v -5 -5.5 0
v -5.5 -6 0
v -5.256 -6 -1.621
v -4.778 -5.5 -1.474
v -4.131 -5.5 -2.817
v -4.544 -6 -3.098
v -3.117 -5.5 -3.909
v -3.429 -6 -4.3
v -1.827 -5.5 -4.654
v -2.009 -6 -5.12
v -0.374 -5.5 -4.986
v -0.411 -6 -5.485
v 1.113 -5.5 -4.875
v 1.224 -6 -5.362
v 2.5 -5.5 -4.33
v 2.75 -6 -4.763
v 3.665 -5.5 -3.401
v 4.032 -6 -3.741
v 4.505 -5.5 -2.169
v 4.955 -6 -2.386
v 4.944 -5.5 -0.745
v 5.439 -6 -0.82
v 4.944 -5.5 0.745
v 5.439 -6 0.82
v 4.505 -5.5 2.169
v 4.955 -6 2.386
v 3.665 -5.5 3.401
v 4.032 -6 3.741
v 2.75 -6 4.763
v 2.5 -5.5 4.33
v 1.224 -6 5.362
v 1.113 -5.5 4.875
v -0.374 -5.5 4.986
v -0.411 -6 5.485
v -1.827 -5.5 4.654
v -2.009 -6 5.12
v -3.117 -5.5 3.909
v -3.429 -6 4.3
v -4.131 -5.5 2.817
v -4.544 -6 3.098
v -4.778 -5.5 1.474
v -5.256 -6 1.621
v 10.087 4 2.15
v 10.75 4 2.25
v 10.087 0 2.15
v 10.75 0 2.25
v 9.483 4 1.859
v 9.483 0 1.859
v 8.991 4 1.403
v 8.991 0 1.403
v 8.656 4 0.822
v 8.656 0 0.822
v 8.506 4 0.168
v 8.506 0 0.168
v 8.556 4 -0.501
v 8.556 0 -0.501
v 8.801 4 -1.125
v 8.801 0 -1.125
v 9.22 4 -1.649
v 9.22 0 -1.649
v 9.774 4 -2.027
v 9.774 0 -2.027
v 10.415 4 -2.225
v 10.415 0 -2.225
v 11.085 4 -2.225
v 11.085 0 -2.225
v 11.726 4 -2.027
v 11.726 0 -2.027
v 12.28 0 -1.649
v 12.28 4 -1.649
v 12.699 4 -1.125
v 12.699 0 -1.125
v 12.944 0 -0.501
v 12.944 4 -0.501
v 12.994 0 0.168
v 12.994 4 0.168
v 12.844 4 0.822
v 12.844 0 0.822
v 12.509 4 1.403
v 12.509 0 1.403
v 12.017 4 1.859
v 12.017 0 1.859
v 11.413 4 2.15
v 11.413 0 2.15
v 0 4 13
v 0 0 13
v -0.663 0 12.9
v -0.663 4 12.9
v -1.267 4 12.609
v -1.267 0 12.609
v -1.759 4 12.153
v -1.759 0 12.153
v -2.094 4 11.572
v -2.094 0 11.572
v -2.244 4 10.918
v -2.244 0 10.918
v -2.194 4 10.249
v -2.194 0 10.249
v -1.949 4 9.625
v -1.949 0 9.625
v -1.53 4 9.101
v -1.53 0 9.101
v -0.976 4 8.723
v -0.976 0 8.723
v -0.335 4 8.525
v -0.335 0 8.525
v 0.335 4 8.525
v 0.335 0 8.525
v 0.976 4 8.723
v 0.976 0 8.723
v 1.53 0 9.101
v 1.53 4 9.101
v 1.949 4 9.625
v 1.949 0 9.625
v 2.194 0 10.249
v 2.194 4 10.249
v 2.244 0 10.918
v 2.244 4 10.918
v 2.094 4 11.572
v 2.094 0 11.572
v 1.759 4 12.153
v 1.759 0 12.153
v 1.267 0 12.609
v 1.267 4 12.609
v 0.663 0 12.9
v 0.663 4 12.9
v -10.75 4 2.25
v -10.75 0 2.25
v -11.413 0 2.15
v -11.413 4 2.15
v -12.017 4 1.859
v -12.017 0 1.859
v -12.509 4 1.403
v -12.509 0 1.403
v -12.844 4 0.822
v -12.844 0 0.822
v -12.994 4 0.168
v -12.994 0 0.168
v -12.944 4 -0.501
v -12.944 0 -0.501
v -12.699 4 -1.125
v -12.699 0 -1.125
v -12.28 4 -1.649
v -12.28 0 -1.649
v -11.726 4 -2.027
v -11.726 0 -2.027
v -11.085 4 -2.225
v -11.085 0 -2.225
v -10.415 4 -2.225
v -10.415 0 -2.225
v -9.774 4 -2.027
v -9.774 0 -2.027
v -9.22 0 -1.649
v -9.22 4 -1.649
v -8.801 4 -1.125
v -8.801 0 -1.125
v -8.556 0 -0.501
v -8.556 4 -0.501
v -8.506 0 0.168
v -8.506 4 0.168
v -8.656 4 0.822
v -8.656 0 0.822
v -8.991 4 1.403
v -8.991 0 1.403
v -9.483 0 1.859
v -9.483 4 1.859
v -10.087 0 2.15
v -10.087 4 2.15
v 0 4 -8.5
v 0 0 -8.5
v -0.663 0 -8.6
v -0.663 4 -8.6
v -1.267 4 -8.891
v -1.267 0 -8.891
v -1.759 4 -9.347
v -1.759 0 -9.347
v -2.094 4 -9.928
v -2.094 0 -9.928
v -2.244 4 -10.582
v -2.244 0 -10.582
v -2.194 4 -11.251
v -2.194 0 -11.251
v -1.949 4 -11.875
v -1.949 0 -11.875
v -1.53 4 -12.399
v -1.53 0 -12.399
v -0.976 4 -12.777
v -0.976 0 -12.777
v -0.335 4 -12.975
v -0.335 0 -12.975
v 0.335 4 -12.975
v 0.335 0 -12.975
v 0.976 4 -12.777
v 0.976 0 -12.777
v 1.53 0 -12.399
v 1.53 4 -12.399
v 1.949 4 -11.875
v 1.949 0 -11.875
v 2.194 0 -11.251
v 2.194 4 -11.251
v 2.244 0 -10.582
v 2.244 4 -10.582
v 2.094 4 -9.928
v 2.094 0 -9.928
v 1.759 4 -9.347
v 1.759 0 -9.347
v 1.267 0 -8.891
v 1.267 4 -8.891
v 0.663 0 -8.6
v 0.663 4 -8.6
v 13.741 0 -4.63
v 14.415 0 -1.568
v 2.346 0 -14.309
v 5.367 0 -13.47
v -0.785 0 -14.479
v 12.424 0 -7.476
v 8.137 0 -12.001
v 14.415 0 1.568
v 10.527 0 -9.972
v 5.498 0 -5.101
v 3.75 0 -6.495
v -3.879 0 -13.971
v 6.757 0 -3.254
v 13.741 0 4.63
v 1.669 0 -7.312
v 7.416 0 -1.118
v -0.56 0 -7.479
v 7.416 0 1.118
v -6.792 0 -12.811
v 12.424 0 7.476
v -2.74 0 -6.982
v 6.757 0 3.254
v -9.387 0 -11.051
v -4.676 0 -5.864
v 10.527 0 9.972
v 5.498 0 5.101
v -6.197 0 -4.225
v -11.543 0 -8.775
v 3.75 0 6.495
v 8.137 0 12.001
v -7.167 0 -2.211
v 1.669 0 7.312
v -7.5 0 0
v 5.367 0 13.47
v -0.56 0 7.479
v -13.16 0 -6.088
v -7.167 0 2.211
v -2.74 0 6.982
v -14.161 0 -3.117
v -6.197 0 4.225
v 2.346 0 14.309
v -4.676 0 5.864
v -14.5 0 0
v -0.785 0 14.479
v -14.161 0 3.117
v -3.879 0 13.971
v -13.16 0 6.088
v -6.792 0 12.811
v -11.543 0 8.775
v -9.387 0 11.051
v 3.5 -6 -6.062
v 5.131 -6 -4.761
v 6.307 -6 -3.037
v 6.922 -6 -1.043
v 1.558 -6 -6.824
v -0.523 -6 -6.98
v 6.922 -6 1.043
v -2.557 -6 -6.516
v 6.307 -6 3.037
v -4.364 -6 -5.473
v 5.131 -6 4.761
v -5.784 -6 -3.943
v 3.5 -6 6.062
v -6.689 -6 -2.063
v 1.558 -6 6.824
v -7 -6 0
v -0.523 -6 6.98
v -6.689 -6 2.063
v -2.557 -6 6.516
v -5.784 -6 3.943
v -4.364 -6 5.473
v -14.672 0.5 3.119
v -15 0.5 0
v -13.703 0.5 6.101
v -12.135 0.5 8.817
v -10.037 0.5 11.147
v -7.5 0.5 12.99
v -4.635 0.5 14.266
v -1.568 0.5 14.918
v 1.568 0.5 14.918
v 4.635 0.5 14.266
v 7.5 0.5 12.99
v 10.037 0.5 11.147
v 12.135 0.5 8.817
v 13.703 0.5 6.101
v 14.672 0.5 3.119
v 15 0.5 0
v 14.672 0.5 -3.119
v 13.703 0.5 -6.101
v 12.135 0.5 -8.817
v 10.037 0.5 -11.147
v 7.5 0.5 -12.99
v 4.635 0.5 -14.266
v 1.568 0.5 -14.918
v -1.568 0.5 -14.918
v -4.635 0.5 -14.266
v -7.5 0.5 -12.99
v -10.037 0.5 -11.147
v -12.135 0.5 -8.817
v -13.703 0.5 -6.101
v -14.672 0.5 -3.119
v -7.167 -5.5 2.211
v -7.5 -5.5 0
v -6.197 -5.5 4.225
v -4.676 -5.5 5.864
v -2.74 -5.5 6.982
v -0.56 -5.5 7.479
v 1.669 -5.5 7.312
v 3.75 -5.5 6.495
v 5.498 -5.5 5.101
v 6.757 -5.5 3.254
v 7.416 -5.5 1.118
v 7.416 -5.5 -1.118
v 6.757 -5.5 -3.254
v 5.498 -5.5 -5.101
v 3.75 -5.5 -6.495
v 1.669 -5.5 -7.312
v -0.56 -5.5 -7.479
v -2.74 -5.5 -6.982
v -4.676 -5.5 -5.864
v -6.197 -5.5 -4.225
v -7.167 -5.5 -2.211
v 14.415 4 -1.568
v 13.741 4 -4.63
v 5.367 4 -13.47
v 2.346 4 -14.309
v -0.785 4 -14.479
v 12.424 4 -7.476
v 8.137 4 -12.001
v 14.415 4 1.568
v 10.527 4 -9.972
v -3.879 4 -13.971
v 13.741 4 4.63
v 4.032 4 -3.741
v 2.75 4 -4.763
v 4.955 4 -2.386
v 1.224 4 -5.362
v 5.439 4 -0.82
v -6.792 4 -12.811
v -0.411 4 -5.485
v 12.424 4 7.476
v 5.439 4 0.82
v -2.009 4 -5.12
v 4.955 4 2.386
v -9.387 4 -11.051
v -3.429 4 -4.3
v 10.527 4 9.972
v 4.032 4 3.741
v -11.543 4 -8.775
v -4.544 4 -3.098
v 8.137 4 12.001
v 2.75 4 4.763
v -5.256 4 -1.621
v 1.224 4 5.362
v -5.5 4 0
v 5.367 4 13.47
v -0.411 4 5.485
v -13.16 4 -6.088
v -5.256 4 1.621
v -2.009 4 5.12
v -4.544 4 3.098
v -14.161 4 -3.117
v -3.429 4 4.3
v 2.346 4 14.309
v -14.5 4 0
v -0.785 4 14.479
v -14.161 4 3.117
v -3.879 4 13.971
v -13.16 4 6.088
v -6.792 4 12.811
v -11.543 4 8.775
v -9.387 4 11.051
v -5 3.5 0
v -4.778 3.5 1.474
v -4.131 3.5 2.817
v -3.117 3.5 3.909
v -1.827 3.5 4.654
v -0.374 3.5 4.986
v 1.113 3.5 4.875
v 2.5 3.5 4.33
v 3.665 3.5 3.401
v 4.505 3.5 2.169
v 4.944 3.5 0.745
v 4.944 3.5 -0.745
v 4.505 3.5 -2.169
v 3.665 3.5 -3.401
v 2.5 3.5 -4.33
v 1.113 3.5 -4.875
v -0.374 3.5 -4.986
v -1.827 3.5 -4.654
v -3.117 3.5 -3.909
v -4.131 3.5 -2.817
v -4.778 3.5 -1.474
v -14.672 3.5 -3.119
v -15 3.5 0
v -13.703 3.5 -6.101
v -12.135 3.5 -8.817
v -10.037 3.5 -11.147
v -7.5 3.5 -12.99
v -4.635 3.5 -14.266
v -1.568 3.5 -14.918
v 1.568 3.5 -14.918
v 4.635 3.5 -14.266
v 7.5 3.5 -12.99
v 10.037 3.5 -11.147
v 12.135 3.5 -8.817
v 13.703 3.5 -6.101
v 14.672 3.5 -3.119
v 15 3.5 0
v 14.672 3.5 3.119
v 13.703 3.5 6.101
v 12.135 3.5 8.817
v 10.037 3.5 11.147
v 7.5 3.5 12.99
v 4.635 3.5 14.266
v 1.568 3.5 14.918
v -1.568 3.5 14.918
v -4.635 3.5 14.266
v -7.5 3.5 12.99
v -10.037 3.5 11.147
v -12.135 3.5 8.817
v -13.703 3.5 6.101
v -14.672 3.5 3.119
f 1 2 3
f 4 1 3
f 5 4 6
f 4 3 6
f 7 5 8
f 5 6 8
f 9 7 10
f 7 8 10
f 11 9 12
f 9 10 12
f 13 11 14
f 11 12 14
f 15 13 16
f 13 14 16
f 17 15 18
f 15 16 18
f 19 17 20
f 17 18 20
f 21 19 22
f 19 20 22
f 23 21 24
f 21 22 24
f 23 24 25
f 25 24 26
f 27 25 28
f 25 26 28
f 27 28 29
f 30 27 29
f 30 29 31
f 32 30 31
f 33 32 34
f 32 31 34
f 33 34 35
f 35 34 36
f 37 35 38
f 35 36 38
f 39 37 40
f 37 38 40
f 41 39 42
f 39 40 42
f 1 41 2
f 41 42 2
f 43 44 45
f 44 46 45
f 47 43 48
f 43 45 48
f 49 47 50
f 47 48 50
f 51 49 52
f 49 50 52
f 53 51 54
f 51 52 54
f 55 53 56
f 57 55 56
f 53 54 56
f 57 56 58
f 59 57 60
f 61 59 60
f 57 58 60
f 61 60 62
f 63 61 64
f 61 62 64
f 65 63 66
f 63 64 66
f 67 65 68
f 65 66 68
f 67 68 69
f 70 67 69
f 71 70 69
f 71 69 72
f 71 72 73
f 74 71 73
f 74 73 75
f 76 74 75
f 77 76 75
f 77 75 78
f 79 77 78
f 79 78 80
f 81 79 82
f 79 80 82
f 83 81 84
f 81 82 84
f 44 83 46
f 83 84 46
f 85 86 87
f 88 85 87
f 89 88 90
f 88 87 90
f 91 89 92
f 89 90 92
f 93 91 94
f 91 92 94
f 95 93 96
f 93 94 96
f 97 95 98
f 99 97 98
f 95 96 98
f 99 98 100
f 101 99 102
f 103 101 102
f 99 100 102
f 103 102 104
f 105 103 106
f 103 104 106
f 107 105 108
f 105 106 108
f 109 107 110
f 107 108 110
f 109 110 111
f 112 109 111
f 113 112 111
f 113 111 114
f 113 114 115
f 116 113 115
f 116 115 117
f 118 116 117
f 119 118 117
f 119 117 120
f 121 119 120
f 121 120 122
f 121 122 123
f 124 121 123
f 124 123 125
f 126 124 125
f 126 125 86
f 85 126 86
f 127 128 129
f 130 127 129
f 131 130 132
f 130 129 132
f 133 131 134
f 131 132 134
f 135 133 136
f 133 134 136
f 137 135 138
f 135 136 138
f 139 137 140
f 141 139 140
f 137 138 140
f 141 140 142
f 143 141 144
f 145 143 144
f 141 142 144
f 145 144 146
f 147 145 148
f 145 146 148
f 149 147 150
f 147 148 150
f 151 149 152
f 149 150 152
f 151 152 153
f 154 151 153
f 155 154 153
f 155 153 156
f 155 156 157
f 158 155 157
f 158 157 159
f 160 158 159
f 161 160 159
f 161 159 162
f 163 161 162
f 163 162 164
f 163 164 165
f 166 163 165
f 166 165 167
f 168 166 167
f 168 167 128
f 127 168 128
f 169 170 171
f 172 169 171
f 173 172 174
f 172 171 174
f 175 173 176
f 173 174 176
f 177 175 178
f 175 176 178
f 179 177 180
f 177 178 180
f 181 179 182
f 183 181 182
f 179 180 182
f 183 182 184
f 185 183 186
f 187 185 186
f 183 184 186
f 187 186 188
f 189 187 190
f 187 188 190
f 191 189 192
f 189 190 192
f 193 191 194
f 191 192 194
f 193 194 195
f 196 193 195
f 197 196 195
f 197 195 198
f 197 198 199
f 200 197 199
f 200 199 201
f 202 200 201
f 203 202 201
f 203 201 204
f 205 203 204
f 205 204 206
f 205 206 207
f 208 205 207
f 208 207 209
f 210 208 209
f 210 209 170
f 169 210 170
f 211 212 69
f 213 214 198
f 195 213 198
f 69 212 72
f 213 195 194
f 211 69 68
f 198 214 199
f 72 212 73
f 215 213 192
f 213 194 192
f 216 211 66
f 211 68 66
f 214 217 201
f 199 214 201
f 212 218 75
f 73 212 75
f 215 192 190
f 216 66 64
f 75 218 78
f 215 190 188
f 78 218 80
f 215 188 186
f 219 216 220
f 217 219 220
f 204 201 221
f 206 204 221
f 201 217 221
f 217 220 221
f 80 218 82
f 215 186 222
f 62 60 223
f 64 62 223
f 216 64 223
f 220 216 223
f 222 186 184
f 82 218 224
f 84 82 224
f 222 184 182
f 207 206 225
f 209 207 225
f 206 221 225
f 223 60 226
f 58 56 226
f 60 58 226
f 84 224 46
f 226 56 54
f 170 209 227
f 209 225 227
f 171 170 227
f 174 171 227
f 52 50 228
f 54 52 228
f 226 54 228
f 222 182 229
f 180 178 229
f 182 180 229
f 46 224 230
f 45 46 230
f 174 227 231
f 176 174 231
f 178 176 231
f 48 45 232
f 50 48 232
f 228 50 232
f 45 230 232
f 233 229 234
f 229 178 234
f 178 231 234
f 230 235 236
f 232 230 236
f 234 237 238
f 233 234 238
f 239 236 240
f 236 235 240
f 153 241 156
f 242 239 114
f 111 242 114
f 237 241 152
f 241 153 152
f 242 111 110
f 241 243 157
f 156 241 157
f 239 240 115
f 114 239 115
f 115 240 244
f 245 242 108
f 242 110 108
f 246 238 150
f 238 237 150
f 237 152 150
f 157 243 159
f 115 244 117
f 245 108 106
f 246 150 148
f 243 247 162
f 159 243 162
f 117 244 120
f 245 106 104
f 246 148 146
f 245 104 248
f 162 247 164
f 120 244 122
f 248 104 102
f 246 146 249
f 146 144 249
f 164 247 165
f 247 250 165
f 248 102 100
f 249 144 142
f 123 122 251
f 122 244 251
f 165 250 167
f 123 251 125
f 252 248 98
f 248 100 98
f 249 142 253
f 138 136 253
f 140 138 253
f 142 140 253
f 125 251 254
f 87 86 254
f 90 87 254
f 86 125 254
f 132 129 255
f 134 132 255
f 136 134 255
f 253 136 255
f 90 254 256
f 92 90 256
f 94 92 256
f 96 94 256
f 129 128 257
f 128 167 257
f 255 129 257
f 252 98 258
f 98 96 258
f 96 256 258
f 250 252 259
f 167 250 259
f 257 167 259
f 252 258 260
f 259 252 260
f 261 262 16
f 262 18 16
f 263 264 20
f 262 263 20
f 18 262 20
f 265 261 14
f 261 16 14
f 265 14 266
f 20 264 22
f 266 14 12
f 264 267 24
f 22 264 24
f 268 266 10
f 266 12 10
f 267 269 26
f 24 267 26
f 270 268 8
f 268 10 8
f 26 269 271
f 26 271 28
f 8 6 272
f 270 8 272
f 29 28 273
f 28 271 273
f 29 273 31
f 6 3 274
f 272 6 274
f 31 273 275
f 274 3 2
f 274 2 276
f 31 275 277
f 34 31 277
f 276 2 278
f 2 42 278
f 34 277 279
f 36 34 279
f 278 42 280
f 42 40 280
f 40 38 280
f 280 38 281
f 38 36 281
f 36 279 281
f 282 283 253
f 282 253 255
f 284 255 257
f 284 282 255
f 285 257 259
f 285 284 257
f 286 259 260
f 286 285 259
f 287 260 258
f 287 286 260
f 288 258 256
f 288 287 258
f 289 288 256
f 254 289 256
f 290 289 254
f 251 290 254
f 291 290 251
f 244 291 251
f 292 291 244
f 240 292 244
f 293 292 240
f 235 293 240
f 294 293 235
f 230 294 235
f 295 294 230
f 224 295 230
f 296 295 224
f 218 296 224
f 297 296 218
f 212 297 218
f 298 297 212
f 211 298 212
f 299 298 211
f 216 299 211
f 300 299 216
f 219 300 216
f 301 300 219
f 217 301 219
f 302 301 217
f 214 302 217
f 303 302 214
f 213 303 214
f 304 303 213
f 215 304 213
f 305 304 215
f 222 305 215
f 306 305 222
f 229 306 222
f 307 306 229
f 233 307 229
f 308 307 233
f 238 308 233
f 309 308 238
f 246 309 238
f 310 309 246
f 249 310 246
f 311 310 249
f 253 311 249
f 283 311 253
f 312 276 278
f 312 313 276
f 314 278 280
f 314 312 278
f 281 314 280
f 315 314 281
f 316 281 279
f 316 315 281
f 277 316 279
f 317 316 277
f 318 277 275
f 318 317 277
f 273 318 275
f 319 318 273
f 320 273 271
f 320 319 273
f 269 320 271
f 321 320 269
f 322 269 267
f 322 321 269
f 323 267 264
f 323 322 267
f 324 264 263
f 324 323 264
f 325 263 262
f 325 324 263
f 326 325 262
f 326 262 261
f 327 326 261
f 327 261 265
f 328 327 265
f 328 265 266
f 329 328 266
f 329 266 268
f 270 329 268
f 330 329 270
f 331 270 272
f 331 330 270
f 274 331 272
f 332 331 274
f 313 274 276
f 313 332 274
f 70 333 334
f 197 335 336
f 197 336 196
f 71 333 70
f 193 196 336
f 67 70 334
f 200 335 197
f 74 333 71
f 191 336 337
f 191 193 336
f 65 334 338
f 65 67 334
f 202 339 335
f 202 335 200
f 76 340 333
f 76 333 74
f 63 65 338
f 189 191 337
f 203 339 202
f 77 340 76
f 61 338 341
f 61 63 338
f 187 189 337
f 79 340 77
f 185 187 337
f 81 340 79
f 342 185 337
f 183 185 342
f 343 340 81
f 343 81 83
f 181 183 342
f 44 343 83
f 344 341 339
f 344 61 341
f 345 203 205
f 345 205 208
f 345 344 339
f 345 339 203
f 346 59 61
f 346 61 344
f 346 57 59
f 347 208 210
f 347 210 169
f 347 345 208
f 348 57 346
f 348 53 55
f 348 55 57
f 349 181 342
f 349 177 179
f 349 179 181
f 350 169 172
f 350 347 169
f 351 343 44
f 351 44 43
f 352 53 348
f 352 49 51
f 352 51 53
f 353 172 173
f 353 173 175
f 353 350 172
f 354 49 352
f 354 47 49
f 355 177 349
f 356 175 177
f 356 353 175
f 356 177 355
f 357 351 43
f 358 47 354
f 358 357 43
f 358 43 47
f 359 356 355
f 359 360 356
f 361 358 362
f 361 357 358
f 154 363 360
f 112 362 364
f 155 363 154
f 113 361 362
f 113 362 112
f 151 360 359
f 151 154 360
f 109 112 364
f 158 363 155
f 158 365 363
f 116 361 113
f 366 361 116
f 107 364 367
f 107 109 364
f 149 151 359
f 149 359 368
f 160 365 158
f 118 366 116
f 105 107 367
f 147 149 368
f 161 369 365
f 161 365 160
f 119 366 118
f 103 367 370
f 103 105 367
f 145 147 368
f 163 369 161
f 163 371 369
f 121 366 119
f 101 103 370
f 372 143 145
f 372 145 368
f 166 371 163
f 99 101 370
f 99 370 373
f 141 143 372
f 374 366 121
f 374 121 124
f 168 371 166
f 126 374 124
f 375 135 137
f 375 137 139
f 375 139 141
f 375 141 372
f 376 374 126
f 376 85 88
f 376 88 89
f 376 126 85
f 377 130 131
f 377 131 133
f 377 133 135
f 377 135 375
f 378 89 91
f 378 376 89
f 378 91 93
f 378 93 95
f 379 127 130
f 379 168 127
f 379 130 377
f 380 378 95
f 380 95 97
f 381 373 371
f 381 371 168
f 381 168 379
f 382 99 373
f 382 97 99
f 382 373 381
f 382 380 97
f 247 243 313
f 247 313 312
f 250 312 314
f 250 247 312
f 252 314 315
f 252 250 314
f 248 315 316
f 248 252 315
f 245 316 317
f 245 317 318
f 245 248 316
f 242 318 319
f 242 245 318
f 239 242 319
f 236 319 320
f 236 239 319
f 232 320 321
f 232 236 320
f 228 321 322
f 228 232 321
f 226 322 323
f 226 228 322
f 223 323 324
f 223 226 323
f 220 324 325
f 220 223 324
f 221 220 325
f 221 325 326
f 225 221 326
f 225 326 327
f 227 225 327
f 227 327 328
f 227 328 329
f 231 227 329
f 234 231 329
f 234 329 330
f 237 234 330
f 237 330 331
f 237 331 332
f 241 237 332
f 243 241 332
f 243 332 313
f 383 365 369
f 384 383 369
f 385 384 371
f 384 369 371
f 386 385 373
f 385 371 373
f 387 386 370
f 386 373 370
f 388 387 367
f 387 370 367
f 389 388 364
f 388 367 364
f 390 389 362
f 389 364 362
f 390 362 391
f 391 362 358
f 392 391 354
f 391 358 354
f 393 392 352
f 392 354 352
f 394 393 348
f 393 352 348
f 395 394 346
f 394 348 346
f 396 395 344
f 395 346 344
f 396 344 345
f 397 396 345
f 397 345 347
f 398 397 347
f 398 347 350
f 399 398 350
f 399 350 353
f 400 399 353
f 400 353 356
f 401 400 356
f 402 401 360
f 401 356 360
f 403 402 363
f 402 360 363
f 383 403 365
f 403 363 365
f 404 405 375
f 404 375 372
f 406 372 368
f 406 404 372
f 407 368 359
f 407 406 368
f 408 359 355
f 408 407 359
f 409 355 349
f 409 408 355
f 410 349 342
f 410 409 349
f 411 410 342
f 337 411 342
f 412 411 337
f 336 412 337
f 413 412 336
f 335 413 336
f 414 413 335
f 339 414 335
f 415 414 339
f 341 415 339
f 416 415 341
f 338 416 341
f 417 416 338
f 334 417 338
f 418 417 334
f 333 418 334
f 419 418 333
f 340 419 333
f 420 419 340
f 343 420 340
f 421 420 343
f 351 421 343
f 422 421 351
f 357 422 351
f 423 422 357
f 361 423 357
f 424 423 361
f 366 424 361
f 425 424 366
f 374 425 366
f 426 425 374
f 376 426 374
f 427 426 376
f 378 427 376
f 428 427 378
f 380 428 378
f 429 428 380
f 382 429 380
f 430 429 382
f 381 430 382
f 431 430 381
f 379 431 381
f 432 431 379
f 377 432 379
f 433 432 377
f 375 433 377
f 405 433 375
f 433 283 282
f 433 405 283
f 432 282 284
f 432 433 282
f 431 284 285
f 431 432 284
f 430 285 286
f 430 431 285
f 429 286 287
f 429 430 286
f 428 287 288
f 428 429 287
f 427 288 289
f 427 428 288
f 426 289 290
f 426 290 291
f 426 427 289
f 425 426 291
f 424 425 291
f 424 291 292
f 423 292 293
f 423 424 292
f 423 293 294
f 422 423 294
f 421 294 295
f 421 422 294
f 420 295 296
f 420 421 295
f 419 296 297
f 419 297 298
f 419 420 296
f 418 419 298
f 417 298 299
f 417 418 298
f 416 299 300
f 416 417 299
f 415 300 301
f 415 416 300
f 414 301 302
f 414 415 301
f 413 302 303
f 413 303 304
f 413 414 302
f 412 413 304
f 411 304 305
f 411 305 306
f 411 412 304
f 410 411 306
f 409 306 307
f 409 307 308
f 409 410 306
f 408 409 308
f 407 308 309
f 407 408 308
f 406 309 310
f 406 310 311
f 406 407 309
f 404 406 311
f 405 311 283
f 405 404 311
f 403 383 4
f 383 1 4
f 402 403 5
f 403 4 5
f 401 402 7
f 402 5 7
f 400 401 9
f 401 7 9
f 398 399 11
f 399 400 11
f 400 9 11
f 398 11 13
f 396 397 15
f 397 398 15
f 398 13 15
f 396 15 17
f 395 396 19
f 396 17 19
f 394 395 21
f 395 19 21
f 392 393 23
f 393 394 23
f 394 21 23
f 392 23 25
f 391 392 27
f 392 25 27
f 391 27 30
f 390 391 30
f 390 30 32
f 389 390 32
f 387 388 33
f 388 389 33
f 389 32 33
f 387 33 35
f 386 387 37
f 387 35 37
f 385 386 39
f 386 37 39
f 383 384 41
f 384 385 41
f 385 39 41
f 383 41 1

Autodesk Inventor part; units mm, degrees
ref_plane "YZ Plane" through (0, 0, 0) normal (1, 0, 0) x (0, 1, 0)
ref_plane "XZ Plane" through (0, 0, 0) normal (0, 1, 0) x (-1, 0, 0)
ref_plane "XY Plane" through (0, 0, 0) normal (0, 0, 1) x (1, 0, 0)
sketch "Esboço1" plane through (0, 0, 0) normal (0, 0, 1) x (1, 0, 0)
  line L0 (-18, 0) -> (3, 0) construction
  line L1 (0, -8) -> (0, 6) construction
  line L2 (-5, 4) -> (-5, -6)
  line L3 (-5, -6) -> (-7.5, -6)
  line L4 (-7.5, -6) -> (-7.5, 0)
  line L5 (-7.5, 0) -> (-15, 0)
  line L6 (-15, 0) -> (-15, 4)
  line L7 (-15, 4) -> (-5, 4)
  point P0 (0, 0)
  dimension "d0" = 30
  dimension "d1" = 10
  dimension "d2" = 4
  dimension "d3" = 10
  dimension "d4" = 15
revolve "Revolução1" add sketch "Esboço1" angle 360 about axis through (0, -10, 0) along (0, 1, 0)
sketch "Esboço2" plane through (0, 4, 0) normal (0, 1, 0) x (1, 0, 0)
  line L0 (-21, 0) -> (21, 0) construction
  line L1 (0, 21) -> (0, -21) construction
  circle A0 centre (0, 0) radius 10.75 construction
  circle A1 centre (0, -10.75) radius 3.5
  circle A2 centre (0, -10.75) radius 2.25
  point P0 (-10.75, 0)
  point P1 (10.75, 0)
  point P2 (0, 10.75)
  dimension "d6" = 21.5
  dimension "d7" = 7
  dimension "d8" = 4.5
hole "Furo1" at (-10.75, 4, 0) at (10.75, 4, 0) at (0, 4, 10.75) at (0, 4, -10.75) direction (0, -1, 0) diameter 4.5 end through all clearance for "Socket Head Cap Screw ISO 4762" size "M4" standard "ISO"
chamfer "Chanfro1" distance 0.5 angle 45 5 edges at (15, 4, 0) (15, 0, 0) (5, 4, 0) (5, -6, 0) (7.5, -6, 0)
properties part number "Compensador Limitador" material "Aço SAE 1045"
